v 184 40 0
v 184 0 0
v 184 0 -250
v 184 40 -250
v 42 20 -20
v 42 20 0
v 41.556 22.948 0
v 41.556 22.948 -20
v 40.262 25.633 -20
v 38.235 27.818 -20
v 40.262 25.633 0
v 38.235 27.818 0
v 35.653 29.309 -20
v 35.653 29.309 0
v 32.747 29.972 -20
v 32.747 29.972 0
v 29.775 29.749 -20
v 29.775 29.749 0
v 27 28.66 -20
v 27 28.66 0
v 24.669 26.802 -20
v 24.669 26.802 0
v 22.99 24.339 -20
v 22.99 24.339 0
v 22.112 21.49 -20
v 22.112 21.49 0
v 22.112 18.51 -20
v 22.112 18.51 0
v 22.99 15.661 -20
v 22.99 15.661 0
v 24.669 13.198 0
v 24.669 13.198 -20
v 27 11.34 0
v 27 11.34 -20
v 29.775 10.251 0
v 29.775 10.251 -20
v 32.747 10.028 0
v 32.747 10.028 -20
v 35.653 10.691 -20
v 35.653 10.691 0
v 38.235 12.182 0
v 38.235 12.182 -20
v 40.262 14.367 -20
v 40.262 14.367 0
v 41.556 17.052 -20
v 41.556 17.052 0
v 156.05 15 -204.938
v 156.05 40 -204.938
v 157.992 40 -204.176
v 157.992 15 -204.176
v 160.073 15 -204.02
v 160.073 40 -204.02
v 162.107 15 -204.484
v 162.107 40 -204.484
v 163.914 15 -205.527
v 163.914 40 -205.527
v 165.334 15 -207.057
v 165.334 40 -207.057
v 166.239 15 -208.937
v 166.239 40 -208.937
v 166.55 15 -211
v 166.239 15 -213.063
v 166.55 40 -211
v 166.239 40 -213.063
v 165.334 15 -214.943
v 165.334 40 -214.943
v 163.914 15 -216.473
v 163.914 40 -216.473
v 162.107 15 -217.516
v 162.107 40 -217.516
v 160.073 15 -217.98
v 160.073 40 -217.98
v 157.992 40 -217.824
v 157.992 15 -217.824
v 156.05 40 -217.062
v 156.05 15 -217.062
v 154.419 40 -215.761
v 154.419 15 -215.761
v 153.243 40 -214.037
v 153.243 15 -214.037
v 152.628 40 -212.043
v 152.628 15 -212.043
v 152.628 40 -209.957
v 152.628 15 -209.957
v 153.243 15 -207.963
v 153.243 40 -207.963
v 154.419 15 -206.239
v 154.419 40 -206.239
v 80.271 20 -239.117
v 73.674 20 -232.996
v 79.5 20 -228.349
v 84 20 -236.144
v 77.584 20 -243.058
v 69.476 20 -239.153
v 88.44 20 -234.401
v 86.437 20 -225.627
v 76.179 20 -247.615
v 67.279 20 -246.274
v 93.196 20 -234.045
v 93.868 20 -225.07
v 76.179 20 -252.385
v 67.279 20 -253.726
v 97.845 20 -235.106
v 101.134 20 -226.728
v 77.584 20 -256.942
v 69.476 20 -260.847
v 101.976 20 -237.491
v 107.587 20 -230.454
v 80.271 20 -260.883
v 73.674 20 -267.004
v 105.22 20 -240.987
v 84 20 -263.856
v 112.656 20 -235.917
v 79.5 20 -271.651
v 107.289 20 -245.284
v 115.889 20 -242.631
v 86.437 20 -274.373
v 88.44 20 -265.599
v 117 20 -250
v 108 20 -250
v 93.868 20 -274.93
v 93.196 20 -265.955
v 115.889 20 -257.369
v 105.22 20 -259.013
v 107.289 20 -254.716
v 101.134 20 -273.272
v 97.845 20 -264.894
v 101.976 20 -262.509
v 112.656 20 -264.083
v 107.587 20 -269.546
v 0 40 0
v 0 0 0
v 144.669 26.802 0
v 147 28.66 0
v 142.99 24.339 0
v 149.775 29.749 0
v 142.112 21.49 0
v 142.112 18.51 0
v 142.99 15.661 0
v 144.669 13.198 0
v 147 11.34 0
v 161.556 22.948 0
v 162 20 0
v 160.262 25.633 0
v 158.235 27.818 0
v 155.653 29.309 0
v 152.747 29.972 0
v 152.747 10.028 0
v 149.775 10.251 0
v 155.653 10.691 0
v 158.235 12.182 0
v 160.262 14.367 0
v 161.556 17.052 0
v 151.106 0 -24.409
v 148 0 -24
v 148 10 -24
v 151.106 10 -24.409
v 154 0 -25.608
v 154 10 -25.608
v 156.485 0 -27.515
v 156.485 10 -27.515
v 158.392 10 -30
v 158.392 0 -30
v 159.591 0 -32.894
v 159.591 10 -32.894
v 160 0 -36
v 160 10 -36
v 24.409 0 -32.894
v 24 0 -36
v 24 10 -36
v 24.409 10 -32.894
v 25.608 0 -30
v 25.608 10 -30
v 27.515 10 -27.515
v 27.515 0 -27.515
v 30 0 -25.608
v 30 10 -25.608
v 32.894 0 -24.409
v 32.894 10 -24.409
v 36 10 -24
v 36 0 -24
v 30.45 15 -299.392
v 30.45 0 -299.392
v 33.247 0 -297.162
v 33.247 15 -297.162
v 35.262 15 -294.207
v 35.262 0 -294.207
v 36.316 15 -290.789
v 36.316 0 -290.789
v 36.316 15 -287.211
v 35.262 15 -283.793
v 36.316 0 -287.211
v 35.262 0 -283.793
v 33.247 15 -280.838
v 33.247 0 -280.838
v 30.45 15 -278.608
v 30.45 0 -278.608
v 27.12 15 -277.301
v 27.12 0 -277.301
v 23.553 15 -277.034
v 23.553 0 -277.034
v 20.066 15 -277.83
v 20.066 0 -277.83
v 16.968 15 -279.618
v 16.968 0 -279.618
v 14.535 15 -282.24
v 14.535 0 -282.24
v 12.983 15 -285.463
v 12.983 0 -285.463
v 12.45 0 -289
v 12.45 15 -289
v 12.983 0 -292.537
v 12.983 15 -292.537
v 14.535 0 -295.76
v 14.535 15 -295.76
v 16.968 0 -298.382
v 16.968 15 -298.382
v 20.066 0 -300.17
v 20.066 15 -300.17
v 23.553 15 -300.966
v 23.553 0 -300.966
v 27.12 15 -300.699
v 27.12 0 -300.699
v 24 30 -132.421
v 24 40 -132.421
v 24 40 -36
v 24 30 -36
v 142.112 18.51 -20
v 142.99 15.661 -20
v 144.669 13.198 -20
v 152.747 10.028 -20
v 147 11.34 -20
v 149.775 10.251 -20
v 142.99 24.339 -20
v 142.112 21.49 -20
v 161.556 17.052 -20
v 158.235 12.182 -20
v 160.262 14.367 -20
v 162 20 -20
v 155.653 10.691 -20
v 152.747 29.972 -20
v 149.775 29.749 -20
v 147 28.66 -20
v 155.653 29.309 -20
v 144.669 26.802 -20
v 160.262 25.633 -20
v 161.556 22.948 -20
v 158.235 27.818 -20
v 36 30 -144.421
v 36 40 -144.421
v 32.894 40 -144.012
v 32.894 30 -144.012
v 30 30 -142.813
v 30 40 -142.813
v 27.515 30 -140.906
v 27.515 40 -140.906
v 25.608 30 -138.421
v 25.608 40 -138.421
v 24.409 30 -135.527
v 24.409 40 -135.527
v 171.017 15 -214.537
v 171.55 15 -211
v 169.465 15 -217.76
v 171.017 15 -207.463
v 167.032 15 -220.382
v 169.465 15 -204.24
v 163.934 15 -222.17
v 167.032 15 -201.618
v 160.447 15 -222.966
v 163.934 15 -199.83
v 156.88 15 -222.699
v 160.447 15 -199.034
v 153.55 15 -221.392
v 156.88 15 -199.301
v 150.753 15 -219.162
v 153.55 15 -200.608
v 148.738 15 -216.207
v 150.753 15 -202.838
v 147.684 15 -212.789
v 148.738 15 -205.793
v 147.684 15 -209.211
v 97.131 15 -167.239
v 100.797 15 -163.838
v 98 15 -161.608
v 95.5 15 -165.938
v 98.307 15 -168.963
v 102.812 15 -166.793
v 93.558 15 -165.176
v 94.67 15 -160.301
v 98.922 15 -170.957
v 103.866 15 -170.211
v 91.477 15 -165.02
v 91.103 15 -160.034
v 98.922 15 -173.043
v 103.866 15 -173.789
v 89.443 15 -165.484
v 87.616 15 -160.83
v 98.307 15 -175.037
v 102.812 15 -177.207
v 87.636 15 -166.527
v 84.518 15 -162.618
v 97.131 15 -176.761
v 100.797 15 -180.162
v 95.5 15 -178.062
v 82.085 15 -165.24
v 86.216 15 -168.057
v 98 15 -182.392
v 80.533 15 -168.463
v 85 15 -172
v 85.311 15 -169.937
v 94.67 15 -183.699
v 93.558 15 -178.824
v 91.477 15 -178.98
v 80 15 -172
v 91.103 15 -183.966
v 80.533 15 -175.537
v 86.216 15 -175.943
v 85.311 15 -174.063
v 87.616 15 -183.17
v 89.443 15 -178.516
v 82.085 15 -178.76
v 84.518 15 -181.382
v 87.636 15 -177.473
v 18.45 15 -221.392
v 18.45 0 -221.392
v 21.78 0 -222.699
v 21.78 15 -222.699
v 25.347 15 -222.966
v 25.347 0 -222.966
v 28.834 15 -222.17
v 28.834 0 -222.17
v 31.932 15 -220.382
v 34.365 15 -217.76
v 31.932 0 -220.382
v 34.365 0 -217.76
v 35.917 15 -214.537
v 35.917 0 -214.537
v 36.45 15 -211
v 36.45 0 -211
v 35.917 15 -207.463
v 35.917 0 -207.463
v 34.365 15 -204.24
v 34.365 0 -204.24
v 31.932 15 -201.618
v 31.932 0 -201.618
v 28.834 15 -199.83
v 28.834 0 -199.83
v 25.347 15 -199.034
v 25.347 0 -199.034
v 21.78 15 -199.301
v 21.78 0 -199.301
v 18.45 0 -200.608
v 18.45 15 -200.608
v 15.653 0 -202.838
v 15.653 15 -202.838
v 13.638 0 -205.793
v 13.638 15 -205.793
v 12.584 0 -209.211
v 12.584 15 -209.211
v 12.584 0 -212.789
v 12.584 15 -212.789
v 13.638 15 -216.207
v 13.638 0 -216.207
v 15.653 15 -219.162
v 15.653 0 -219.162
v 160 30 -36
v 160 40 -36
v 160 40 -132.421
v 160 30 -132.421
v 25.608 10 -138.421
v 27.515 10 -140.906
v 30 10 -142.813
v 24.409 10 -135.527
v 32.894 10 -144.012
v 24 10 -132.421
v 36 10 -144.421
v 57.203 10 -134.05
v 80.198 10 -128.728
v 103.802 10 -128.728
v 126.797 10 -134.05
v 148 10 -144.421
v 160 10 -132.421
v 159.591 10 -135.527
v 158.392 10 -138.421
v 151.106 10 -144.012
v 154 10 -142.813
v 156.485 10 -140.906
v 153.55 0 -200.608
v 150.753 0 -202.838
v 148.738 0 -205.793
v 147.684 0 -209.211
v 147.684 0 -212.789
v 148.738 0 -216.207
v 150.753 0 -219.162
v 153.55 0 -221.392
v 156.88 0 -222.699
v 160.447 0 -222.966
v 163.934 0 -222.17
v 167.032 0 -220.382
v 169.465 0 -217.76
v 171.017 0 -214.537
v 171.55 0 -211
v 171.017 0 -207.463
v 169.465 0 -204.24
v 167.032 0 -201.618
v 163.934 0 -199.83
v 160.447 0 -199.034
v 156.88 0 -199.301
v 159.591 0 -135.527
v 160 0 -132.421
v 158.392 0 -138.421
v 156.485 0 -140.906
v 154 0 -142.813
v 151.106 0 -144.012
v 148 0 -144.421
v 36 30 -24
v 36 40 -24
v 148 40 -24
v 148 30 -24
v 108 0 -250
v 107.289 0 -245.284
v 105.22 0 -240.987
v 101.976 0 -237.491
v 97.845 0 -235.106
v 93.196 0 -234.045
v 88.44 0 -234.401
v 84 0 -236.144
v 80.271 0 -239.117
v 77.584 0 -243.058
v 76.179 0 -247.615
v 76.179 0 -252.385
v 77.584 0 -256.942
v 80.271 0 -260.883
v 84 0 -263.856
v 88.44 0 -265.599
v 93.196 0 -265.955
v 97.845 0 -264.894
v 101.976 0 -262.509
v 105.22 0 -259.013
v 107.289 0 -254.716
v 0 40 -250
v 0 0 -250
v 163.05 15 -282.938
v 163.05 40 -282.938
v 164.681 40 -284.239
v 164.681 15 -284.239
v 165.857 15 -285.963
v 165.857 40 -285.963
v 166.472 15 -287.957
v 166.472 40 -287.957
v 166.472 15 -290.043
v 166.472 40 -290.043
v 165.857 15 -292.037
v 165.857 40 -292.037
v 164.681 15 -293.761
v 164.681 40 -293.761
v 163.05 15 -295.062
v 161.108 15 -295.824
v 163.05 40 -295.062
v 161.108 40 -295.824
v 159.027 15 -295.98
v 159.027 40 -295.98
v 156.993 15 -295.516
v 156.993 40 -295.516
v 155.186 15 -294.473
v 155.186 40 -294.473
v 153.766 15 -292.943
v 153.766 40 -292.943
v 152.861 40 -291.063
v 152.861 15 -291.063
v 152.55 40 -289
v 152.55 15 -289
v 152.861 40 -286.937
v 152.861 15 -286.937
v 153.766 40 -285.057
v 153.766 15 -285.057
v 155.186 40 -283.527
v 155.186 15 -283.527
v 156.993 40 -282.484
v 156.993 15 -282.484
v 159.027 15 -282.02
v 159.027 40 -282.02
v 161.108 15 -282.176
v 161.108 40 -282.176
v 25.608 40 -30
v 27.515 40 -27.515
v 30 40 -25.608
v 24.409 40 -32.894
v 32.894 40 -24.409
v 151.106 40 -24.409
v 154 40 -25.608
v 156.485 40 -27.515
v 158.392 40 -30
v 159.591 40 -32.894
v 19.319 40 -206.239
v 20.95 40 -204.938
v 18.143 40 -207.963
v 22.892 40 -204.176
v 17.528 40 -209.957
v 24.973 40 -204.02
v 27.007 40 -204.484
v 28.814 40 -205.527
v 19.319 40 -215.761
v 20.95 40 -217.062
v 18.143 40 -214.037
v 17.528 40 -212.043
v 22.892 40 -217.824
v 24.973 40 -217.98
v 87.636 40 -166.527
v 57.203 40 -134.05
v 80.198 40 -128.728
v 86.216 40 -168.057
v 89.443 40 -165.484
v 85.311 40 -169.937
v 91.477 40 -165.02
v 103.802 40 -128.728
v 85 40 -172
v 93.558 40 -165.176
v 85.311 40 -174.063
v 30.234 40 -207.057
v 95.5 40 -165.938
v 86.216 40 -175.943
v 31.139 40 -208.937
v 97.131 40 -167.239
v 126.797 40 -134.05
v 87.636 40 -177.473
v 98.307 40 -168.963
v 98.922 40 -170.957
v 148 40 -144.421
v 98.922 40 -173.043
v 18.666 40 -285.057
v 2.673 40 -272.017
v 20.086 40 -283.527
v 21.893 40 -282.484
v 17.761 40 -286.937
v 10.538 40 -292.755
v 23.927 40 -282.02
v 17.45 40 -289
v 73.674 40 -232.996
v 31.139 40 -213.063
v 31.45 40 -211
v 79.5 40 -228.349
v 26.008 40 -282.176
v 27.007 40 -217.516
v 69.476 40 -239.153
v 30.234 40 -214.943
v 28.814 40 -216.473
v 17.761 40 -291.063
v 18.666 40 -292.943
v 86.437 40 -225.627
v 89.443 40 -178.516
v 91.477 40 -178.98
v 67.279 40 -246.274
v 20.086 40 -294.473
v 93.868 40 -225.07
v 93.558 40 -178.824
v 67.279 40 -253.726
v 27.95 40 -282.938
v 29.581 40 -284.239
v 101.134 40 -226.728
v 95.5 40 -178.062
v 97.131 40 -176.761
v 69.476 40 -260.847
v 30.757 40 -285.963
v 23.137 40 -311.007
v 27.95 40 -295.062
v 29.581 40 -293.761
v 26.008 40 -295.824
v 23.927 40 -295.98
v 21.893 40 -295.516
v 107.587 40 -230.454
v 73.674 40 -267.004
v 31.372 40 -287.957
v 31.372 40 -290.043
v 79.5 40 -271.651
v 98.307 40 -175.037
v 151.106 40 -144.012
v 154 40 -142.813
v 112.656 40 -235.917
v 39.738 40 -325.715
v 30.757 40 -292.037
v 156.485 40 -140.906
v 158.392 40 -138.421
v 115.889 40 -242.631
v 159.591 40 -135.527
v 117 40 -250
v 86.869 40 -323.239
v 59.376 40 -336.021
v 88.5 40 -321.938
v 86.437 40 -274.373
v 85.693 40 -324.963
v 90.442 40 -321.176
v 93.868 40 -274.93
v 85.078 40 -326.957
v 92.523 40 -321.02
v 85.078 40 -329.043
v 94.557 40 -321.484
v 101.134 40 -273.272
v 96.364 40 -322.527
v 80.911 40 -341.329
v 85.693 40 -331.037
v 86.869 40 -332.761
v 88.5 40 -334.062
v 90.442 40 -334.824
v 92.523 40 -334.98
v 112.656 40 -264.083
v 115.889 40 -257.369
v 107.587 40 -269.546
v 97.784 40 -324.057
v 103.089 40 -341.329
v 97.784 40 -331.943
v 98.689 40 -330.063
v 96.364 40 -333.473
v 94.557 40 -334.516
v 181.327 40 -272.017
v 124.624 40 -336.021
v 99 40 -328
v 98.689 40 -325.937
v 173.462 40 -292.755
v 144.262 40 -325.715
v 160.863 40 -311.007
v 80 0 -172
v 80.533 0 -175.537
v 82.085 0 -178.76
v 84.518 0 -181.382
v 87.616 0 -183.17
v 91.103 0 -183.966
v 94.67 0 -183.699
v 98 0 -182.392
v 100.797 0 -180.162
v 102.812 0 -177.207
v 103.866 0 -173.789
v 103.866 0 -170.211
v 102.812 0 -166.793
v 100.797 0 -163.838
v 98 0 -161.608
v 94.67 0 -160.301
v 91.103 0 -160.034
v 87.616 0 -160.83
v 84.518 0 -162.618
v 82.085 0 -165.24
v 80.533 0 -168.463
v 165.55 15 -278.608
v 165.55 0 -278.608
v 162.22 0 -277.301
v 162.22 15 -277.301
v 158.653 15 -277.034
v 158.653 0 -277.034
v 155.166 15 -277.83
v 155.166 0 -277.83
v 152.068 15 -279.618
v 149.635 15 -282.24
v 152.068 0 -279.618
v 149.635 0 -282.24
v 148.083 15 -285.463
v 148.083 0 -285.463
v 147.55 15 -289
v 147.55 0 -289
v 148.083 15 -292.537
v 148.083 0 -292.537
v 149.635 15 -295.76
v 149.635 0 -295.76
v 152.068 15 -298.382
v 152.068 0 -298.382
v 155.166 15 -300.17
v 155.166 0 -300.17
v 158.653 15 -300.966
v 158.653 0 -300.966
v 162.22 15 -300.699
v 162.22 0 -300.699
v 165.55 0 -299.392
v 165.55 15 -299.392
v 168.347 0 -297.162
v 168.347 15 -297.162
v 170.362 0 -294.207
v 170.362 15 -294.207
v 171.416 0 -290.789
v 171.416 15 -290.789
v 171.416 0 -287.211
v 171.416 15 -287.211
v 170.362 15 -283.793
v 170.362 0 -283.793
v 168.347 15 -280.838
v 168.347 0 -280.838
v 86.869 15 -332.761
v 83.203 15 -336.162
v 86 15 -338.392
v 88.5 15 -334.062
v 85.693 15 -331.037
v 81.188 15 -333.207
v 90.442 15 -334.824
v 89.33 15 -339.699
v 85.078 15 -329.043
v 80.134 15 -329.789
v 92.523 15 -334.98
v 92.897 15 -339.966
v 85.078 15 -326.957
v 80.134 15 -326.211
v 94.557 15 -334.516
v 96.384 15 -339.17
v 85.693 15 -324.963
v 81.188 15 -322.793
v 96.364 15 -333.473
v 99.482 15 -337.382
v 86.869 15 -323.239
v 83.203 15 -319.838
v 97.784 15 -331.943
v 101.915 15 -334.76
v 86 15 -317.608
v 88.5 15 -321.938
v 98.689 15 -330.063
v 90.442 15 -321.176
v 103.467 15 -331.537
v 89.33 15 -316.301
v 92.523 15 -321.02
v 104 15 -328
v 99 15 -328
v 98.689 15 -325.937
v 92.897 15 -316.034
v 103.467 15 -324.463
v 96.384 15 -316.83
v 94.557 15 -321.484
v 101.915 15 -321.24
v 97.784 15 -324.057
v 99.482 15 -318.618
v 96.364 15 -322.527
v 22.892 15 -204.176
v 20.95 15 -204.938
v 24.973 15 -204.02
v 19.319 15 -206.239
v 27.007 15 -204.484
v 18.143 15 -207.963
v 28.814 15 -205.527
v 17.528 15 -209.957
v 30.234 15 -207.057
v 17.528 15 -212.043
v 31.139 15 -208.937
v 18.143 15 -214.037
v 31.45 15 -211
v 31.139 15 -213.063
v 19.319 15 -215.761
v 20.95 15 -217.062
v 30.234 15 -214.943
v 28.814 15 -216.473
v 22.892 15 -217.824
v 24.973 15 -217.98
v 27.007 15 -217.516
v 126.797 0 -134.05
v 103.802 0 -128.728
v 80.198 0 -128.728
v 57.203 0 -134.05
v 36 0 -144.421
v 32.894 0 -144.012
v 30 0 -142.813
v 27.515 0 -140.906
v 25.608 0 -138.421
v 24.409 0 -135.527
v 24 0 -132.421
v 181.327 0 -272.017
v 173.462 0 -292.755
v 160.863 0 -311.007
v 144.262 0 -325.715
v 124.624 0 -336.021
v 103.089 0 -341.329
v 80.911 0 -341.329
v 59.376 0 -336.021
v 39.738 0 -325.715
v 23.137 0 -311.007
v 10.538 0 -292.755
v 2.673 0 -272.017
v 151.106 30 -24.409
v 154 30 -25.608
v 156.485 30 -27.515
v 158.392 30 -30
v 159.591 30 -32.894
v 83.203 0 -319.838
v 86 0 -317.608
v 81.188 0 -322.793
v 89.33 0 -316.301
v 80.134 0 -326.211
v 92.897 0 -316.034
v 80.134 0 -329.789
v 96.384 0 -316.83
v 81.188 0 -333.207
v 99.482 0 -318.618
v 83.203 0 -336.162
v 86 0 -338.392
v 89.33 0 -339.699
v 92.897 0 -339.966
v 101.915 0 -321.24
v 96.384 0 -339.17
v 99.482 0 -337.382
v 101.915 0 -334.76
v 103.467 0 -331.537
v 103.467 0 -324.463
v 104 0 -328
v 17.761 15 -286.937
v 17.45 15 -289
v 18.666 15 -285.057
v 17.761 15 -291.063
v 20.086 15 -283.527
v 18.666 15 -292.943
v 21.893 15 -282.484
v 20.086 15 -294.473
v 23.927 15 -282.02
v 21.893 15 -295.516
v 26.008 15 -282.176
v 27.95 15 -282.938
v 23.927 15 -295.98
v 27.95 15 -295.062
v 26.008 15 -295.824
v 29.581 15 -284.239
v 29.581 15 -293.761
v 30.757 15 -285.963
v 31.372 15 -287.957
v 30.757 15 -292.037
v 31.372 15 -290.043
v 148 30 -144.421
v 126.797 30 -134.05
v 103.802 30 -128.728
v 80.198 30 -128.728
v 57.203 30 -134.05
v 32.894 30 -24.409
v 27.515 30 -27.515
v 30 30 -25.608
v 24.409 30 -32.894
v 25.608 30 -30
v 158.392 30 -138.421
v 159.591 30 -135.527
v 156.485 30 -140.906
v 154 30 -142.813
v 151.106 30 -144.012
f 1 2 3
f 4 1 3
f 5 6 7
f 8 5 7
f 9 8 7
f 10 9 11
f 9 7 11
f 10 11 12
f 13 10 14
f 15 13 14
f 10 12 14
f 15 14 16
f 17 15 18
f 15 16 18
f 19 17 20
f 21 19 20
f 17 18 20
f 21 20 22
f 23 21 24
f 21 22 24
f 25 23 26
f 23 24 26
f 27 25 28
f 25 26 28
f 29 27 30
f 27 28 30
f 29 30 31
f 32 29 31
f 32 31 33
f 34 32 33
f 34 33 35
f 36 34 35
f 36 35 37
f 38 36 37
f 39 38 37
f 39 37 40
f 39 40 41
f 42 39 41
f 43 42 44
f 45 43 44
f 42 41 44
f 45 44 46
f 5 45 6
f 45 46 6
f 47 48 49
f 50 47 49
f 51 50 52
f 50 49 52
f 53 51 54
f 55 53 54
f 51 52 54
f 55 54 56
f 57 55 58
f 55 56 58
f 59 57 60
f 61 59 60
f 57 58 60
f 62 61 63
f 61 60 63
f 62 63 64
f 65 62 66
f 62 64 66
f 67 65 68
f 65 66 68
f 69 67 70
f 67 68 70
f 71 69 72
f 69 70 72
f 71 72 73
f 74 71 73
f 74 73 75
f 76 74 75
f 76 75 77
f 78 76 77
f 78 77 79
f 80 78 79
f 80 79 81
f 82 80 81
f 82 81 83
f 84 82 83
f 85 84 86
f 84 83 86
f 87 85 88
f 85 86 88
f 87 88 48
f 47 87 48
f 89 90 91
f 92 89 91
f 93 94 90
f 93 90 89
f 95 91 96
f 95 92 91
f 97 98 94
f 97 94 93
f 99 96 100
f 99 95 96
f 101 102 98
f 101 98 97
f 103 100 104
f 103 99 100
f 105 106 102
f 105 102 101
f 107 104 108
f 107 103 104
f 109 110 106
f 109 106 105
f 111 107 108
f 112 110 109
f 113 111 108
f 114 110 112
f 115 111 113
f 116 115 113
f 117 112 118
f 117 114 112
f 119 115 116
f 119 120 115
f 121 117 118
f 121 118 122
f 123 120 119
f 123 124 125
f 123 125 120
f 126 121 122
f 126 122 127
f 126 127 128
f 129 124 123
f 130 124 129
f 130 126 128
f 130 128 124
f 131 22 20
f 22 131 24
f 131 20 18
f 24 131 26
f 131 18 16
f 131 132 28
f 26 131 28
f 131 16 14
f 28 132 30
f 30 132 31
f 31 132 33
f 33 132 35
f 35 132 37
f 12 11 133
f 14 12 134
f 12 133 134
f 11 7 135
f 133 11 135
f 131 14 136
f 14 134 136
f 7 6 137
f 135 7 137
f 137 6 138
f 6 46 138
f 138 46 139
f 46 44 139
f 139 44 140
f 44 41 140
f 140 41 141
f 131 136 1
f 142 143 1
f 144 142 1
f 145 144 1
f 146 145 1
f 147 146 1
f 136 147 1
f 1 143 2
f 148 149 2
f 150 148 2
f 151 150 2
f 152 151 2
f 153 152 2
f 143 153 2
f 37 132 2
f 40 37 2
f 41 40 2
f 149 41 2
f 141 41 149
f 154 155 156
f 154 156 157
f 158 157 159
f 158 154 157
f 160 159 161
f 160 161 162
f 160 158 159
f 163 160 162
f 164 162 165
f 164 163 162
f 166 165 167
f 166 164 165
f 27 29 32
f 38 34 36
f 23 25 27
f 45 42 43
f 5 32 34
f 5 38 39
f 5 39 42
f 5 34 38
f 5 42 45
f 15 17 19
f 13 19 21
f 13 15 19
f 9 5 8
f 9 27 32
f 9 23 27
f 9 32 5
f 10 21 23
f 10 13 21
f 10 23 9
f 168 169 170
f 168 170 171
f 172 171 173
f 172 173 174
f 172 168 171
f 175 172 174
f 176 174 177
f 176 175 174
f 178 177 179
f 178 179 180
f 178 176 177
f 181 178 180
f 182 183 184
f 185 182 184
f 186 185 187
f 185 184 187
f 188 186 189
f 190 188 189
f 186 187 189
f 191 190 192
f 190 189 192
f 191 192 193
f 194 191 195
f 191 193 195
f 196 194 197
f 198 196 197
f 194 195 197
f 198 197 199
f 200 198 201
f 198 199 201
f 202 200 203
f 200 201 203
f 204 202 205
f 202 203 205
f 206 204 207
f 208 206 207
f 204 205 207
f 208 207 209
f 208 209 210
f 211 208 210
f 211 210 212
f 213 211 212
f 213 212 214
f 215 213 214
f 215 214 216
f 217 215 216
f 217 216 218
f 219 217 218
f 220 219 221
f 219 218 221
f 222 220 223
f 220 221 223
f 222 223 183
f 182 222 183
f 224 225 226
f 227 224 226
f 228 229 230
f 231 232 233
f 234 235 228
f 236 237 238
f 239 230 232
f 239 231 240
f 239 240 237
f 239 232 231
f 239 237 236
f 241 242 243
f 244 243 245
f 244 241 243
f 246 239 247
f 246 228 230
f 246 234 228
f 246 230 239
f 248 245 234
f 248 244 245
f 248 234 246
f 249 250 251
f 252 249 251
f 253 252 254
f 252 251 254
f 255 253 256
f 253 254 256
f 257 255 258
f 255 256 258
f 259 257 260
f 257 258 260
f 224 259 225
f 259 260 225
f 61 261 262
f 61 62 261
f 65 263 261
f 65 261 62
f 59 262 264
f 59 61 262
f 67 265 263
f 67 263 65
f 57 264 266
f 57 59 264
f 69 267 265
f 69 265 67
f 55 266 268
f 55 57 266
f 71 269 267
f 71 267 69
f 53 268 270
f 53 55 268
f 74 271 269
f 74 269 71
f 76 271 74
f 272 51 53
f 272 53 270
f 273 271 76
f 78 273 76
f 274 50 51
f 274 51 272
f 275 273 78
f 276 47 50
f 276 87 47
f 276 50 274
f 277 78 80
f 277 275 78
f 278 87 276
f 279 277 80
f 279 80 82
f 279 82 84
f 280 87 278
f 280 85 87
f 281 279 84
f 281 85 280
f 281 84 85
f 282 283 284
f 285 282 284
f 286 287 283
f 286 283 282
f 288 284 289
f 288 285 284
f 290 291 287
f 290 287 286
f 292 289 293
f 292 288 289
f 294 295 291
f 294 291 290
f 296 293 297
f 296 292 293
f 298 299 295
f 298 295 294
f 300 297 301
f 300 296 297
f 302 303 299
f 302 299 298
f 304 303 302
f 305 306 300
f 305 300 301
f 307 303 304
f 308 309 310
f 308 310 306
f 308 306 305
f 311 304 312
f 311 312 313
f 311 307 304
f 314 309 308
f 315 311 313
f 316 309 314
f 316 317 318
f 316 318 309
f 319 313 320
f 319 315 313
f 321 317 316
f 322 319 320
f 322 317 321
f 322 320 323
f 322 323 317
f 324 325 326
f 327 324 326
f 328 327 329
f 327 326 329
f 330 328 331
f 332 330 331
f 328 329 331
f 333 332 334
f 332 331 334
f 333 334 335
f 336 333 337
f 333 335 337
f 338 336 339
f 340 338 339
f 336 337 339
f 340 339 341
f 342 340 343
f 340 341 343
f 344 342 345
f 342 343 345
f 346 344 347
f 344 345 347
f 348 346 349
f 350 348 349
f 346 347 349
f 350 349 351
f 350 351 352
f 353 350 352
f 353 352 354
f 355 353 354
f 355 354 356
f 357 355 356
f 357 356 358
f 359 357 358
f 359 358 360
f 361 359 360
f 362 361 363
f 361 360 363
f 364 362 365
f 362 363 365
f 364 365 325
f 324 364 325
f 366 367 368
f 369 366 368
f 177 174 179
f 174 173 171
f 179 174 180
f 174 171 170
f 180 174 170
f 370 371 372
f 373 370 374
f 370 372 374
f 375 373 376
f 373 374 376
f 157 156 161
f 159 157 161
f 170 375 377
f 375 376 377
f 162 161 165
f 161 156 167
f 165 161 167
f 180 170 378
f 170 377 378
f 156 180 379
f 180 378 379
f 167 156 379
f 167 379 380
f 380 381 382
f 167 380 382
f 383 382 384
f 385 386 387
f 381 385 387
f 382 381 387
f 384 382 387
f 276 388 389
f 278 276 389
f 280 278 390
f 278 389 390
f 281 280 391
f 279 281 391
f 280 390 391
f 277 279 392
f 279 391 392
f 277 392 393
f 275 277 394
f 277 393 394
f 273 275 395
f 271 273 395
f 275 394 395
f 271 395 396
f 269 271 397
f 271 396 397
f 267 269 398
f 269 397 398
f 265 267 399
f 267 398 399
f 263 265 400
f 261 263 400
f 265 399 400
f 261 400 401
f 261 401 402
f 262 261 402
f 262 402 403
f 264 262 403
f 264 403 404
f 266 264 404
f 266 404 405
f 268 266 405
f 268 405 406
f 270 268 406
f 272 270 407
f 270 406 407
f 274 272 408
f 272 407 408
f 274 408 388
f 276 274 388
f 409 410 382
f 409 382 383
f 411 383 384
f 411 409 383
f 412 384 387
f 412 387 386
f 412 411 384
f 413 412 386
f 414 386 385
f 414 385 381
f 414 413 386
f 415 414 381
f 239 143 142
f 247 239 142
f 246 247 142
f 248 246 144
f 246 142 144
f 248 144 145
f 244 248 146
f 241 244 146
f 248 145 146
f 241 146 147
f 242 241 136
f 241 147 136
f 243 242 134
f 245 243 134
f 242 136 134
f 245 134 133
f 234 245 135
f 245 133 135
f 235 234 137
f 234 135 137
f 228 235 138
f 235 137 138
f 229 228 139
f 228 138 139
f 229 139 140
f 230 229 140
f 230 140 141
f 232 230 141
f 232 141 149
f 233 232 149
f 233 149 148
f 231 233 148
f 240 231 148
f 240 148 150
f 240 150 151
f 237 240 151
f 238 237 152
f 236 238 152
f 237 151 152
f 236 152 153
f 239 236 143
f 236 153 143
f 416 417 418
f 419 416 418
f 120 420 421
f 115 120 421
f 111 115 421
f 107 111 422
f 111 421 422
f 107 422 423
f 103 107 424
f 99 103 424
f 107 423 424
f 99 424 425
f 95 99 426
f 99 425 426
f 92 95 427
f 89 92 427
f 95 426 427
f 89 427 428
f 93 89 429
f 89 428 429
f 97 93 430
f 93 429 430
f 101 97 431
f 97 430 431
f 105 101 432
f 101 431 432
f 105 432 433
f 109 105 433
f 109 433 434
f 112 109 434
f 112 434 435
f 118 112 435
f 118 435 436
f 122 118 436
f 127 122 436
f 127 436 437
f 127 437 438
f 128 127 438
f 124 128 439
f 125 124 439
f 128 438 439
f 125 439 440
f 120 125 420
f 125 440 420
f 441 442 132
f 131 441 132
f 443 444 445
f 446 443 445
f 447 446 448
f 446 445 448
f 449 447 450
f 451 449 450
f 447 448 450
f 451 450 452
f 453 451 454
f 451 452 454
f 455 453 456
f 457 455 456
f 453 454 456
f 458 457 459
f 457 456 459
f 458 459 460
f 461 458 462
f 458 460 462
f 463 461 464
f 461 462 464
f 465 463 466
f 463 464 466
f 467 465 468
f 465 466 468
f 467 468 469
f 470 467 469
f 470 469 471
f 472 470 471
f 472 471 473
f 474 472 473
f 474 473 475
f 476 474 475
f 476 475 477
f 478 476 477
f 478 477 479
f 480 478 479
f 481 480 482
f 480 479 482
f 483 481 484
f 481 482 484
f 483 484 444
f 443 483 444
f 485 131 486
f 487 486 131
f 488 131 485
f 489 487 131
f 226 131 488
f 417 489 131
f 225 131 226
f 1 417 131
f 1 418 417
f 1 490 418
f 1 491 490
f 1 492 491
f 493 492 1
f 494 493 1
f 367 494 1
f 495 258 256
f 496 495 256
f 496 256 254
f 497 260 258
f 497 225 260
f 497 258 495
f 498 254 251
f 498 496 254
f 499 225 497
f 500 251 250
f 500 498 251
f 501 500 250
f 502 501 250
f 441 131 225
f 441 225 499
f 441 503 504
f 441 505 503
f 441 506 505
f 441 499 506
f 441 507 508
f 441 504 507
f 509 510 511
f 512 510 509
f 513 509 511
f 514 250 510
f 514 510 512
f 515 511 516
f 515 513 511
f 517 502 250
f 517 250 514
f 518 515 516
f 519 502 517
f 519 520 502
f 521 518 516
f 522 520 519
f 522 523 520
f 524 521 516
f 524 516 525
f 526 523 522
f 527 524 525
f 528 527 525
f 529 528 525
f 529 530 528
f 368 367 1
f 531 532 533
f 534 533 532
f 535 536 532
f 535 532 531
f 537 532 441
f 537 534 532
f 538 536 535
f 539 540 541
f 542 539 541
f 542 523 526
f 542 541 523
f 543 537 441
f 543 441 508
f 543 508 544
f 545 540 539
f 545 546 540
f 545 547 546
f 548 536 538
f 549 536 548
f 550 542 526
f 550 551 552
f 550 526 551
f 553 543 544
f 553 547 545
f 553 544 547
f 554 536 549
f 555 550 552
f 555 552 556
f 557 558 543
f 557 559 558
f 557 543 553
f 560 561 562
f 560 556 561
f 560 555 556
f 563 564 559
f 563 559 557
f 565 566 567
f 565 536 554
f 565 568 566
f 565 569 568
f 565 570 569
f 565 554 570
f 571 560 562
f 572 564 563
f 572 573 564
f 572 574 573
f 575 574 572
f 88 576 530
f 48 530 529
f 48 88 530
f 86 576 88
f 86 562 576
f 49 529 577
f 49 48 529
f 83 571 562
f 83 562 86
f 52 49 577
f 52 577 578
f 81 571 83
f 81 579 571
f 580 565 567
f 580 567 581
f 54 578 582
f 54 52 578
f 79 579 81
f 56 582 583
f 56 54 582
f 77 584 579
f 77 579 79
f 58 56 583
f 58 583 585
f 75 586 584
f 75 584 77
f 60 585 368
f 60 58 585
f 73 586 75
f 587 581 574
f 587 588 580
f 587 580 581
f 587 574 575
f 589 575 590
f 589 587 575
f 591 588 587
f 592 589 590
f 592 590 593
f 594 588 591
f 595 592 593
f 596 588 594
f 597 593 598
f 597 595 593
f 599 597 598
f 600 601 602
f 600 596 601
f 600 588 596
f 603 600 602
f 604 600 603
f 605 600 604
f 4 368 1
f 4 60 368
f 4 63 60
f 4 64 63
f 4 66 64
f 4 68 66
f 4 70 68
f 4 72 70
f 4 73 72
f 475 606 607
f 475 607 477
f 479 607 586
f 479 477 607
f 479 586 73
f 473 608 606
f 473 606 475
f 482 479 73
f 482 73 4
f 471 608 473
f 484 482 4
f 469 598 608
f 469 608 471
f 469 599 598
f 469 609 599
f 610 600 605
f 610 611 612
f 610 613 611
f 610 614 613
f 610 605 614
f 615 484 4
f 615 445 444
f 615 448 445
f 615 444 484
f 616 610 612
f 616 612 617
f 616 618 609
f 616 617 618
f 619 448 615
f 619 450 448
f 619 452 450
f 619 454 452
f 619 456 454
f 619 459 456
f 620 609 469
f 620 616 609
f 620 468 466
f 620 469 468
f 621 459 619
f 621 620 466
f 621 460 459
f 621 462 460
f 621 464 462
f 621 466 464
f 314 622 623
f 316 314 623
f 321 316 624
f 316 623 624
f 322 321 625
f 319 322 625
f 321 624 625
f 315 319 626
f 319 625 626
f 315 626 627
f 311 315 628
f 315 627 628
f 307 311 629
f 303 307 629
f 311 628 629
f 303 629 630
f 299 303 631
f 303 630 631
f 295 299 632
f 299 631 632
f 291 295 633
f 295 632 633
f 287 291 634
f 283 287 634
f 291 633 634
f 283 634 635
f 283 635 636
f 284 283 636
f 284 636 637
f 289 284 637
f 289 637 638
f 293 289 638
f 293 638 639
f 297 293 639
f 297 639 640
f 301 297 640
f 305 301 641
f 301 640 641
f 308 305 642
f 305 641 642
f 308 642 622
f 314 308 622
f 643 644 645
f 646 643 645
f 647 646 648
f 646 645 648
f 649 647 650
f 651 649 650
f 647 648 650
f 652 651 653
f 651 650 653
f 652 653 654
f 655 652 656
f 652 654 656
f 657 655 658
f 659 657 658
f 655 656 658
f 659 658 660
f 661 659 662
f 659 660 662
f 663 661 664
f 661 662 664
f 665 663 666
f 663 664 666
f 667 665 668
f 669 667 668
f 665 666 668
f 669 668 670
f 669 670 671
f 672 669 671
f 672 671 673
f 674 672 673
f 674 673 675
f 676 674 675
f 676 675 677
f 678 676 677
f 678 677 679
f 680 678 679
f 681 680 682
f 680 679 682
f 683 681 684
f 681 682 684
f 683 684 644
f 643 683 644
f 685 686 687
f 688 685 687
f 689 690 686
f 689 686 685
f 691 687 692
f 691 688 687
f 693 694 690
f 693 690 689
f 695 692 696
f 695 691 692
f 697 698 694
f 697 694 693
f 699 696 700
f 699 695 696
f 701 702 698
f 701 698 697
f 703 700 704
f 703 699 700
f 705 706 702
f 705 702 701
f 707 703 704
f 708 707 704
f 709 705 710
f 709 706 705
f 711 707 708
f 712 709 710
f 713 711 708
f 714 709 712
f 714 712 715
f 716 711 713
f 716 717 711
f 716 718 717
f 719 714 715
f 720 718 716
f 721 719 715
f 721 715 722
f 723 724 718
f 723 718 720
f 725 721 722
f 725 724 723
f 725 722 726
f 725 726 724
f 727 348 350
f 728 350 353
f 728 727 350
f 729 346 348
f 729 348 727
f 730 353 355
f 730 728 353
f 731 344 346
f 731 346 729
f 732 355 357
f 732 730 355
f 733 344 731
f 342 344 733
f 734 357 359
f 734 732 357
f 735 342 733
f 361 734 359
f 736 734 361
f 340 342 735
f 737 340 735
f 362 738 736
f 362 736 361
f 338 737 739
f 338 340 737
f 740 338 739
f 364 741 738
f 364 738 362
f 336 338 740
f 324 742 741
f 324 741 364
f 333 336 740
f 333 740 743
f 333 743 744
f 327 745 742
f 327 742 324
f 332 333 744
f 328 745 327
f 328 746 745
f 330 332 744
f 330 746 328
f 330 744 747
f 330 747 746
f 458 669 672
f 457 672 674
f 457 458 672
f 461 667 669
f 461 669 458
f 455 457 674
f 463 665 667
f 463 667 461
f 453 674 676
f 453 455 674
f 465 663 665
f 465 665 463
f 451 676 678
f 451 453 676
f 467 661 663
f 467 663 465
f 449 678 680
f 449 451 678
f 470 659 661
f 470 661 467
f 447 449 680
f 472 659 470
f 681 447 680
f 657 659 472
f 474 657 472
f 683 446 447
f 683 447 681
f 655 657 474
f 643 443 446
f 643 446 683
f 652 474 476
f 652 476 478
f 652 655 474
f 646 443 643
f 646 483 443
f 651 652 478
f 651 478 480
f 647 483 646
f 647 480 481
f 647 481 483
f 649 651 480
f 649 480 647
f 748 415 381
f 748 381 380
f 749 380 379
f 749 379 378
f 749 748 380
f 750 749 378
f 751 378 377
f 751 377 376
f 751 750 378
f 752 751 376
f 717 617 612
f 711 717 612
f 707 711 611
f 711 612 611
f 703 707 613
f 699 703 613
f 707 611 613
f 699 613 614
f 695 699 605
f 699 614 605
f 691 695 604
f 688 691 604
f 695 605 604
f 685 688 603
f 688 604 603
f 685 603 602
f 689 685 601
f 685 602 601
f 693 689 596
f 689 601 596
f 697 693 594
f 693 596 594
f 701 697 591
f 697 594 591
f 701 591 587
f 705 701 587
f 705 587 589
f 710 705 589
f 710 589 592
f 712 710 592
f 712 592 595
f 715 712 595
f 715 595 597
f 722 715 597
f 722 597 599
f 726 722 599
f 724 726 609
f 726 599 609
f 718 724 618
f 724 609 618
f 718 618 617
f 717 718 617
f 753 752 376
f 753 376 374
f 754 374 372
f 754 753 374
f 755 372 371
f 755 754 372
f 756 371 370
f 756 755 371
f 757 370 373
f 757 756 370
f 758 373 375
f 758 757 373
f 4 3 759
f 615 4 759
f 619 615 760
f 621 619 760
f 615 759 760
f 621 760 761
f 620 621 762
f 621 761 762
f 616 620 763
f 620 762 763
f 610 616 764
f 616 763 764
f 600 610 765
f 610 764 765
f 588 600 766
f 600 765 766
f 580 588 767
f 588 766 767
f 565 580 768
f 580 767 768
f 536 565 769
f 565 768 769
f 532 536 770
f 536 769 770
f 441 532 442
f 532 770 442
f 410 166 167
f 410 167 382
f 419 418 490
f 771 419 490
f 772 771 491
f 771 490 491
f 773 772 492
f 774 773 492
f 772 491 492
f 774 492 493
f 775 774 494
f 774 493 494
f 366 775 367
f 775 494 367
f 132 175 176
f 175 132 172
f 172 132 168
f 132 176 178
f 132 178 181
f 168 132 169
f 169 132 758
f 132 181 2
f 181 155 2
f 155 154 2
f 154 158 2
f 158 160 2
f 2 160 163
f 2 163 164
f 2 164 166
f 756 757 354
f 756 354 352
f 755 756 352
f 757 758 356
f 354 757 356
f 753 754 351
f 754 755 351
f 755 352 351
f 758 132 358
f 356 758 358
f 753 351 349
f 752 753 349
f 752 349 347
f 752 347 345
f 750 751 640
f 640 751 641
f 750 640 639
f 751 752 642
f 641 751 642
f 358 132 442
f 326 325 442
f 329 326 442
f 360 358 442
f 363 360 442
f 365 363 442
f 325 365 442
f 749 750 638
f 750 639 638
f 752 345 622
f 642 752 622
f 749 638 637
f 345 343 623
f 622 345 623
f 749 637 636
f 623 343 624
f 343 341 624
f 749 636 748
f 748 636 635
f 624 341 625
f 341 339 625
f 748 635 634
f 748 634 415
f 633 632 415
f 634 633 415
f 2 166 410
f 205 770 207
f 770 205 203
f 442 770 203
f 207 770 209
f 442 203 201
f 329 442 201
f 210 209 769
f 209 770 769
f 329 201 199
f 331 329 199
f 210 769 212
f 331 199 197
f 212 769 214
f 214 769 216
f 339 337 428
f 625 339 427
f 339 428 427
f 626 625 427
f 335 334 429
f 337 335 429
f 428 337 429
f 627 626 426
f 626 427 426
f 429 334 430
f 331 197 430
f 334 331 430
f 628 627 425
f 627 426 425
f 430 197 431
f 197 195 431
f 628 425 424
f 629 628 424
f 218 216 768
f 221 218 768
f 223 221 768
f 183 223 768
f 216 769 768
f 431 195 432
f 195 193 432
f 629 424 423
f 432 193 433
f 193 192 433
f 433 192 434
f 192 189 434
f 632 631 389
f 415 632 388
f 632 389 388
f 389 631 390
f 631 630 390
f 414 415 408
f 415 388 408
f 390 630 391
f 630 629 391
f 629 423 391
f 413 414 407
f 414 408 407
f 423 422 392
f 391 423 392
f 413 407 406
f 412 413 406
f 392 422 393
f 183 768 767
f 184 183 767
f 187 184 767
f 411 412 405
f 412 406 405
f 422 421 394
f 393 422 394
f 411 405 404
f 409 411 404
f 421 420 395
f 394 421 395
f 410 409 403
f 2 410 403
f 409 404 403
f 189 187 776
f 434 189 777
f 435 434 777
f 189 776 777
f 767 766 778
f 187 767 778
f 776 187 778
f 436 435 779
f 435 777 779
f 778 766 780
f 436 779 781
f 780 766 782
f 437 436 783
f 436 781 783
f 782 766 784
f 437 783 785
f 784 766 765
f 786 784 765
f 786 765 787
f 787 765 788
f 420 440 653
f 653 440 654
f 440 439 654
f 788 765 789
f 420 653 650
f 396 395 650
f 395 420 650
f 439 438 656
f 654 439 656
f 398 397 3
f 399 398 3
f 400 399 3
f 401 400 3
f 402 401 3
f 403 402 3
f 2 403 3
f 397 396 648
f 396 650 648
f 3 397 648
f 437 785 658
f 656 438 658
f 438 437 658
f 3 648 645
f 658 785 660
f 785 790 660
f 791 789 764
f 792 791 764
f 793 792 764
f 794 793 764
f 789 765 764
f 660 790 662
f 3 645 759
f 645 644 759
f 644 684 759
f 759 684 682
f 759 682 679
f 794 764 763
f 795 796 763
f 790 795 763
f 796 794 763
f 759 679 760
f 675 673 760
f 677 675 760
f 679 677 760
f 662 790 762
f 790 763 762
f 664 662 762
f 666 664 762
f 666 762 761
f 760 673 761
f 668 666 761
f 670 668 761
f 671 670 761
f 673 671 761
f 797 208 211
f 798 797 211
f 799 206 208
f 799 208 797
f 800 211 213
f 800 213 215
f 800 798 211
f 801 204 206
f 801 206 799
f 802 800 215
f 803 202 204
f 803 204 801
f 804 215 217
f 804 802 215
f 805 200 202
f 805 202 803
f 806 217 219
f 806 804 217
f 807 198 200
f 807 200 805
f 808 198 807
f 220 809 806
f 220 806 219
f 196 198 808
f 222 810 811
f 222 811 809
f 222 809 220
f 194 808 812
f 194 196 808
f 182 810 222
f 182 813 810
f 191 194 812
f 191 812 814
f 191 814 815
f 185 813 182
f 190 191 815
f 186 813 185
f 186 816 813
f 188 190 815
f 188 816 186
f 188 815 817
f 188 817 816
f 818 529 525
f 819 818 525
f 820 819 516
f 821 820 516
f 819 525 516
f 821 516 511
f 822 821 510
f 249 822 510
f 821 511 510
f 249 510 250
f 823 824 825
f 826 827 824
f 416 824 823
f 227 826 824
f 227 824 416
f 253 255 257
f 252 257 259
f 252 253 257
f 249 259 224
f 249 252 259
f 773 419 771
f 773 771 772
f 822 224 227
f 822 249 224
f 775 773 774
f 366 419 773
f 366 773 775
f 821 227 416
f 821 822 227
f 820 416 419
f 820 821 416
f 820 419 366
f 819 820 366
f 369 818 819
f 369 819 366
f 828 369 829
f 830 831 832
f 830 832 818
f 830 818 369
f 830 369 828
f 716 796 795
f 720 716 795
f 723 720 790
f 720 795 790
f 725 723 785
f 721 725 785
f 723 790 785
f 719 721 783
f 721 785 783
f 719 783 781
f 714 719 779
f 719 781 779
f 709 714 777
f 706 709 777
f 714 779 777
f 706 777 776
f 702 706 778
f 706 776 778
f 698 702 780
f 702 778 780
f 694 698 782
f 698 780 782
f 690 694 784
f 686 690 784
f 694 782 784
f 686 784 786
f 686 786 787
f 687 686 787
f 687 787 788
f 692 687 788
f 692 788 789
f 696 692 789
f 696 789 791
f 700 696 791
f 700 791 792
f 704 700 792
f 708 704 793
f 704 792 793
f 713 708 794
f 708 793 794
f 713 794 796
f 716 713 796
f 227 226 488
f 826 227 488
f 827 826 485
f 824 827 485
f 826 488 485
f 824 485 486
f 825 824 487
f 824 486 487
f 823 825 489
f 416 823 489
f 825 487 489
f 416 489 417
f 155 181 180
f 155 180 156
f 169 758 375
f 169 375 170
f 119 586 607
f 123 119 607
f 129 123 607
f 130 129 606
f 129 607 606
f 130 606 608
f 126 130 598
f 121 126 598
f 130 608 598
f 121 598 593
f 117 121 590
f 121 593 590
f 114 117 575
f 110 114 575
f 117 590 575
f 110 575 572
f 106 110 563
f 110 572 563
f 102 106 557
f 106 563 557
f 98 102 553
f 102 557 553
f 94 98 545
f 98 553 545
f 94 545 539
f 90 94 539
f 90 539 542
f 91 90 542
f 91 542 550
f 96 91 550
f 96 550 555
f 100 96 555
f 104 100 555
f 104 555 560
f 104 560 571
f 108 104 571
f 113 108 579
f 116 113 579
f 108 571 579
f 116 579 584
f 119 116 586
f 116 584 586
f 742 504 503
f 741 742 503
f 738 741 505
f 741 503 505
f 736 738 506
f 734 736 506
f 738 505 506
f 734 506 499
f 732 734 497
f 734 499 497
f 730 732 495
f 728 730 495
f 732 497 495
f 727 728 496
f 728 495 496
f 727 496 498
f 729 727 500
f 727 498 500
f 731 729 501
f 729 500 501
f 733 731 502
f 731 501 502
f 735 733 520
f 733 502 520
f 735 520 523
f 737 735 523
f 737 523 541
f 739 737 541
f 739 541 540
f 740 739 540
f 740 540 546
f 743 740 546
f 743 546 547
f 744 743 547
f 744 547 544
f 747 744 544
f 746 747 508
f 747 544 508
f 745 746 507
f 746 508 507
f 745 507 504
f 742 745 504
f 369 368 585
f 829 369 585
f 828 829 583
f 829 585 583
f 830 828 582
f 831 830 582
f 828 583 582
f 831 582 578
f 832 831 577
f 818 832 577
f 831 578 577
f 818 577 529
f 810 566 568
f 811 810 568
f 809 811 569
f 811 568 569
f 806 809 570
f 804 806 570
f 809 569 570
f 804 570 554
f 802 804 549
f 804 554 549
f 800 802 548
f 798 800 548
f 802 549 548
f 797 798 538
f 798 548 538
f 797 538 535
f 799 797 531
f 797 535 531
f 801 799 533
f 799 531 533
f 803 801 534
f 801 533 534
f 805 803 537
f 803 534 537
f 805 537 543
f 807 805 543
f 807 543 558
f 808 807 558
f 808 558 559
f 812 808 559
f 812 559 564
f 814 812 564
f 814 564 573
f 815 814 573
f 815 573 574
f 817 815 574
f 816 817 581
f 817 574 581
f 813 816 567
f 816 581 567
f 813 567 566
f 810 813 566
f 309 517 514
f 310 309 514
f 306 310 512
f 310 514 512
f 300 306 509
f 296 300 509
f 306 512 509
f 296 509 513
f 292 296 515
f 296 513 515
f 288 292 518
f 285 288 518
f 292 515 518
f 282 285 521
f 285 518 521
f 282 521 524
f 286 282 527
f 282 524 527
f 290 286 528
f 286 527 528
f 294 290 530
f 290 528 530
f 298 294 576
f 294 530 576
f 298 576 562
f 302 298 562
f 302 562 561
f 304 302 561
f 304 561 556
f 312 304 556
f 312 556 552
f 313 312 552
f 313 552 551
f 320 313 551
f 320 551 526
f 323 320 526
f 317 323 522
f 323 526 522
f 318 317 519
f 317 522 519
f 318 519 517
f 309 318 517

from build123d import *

# Parameters (mm, degrees)
BOSS_EXTRUDE1_DEPTH = 40
SKETCH5_R           = 25
CUT_EXTRUDE1_DEPTH  = 20
SKETCH6_R           = 16
CUT_EXTRUDE2_DEPTH  = 20
SKETCH7_R           = 7
CUT_EXTRUDE3_DEPTH  = 25
CIRPATTERN1_COUNT   = 6
SKETCH8_R           = 12
CUT_EXTRUDE4_DEPTH  = 15
CIRPATTERN2_COUNT   = 6
CUT_EXTRUDE5_DEPTH  = 10
SKETCH13_R          = 10
CUT_EXTRUDE10_DEPTH = 20


with BuildPart() as part:
    # Sketch3 → Boss-Extrude1 (new body)
    with BuildSketch(Plane(origin=(0, 0, 0), x_dir=(1, 0, 0), z_dir=(0, 1, 0))):
        with BuildLine():
            Line((0, 0), (184, 0))
            Line((184, 0), (184, 250))
            ThreePointArc((184, 250), (92, 342), (0, 250))
            Line((0, 250), (0, 0))
        make_face()
    extrude(amount=BOSS_EXTRUDE1_DEPTH)

    # Sketch5 → Cut-Extrude1 (cut)
    with BuildSketch(Plane(origin=(0, 40, 0), x_dir=(1, 0, 0), z_dir=(0, 1, 0))):
        with Locations((92, 250)):
            Circle(SKETCH5_R)
    extrude(amount=-CUT_EXTRUDE1_DEPTH, mode=Mode.SUBTRACT)

    # Sketch6 → Cut-Extrude2 (cut)
    with BuildSketch(Plane.XZ):
        with Locations((92, -250)):
            Circle(SKETCH6_R)
    extrude(amount=-CUT_EXTRUDE2_DEPTH, mode=Mode.SUBTRACT)

    # Sketch7 → Cut-Extrude3 (cut)
    with BuildSketch(Plane(origin=(0, 40, 0), x_dir=(1, 0, 0), z_dir=(0, 1, 0))):
        with Locations((92, 328)):
            Circle(SKETCH7_R)
    cut_extrude3 = extrude(amount=-CUT_EXTRUDE3_DEPTH, mode=Mode.SUBTRACT)

    # CirPattern1: Cut-Extrude3 ×6 about axis
    cirpattern1_axis = Axis((92, 0, -250), (0, 1, 0))
    for i in range(1, CIRPATTERN1_COUNT):
        add(cut_extrude3.rotate(cirpattern1_axis, i * 360 / CIRPATTERN1_COUNT), mode=Mode.SUBTRACT)

    # Sketch8 → Cut-Extrude4 (cut)
    with BuildSketch(Plane.XZ):
        with Locations((92, -328)):
            Circle(SKETCH8_R)
    cut_extrude4 = extrude(amount=-CUT_EXTRUDE4_DEPTH, mode=Mode.SUBTRACT)

    # CirPattern2: Cut-Extrude4 ×6 about axis
    cirpattern2_axis = Axis((92, 0, -250), (0, 1, 0))
    for i in range(1, CIRPATTERN2_COUNT):
        add(cut_extrude4.rotate(cirpattern2_axis, i * 360 / CIRPATTERN2_COUNT), mode=Mode.SUBTRACT)

    # Sketch9 → Cut-Extrude5 (cut)
    with BuildSketch(Plane(origin=(0, 40, 0), x_dir=(1, 0, 0), z_dir=(0, 1, 0))):
        with BuildLine():
            Line((36, 24), (148, 24))
            ThreePointArc((148, 24), (156.485281374, 27.514718626), (160, 36))
            Line((160, 36), (160, 132.420765027))
            ThreePointArc((160, 132.420765027), (156.485281374, 140.906046402), (148, 144.420765027))
            ThreePointArc((148, 144.420765027), (92, 128.056374228), (36, 144.420765027))
            ThreePointArc((36, 144.420765027), (27.514718626, 140.906046402), (24, 132.420765027))
            Line((24, 132.420765027), (24, 36))
            ThreePointArc((24, 36), (27.514718626, 27.514718626), (36, 24))
        make_face()
    cut_extrude5 = extrude(amount=-CUT_EXTRUDE5_DEPTH, mode=Mode.SUBTRACT)

    # Mirror1: Cut-Extrude5 across plane
    add(cut_extrude5.mirror(Plane.ZX.offset(20)), mode=Mode.SUBTRACT)

    # Sketch13 → Cut-Extrude10 (cut)
    with BuildSketch(Plane.XY):
        with Locations((32, 20)):
            Circle(SKETCH13_R)
        with Locations((152, 20)):
            Circle(SKETCH13_R)
    extrude(amount=-CUT_EXTRUDE10_DEPTH, mode=Mode.SUBTRACT)


solid = part.part
